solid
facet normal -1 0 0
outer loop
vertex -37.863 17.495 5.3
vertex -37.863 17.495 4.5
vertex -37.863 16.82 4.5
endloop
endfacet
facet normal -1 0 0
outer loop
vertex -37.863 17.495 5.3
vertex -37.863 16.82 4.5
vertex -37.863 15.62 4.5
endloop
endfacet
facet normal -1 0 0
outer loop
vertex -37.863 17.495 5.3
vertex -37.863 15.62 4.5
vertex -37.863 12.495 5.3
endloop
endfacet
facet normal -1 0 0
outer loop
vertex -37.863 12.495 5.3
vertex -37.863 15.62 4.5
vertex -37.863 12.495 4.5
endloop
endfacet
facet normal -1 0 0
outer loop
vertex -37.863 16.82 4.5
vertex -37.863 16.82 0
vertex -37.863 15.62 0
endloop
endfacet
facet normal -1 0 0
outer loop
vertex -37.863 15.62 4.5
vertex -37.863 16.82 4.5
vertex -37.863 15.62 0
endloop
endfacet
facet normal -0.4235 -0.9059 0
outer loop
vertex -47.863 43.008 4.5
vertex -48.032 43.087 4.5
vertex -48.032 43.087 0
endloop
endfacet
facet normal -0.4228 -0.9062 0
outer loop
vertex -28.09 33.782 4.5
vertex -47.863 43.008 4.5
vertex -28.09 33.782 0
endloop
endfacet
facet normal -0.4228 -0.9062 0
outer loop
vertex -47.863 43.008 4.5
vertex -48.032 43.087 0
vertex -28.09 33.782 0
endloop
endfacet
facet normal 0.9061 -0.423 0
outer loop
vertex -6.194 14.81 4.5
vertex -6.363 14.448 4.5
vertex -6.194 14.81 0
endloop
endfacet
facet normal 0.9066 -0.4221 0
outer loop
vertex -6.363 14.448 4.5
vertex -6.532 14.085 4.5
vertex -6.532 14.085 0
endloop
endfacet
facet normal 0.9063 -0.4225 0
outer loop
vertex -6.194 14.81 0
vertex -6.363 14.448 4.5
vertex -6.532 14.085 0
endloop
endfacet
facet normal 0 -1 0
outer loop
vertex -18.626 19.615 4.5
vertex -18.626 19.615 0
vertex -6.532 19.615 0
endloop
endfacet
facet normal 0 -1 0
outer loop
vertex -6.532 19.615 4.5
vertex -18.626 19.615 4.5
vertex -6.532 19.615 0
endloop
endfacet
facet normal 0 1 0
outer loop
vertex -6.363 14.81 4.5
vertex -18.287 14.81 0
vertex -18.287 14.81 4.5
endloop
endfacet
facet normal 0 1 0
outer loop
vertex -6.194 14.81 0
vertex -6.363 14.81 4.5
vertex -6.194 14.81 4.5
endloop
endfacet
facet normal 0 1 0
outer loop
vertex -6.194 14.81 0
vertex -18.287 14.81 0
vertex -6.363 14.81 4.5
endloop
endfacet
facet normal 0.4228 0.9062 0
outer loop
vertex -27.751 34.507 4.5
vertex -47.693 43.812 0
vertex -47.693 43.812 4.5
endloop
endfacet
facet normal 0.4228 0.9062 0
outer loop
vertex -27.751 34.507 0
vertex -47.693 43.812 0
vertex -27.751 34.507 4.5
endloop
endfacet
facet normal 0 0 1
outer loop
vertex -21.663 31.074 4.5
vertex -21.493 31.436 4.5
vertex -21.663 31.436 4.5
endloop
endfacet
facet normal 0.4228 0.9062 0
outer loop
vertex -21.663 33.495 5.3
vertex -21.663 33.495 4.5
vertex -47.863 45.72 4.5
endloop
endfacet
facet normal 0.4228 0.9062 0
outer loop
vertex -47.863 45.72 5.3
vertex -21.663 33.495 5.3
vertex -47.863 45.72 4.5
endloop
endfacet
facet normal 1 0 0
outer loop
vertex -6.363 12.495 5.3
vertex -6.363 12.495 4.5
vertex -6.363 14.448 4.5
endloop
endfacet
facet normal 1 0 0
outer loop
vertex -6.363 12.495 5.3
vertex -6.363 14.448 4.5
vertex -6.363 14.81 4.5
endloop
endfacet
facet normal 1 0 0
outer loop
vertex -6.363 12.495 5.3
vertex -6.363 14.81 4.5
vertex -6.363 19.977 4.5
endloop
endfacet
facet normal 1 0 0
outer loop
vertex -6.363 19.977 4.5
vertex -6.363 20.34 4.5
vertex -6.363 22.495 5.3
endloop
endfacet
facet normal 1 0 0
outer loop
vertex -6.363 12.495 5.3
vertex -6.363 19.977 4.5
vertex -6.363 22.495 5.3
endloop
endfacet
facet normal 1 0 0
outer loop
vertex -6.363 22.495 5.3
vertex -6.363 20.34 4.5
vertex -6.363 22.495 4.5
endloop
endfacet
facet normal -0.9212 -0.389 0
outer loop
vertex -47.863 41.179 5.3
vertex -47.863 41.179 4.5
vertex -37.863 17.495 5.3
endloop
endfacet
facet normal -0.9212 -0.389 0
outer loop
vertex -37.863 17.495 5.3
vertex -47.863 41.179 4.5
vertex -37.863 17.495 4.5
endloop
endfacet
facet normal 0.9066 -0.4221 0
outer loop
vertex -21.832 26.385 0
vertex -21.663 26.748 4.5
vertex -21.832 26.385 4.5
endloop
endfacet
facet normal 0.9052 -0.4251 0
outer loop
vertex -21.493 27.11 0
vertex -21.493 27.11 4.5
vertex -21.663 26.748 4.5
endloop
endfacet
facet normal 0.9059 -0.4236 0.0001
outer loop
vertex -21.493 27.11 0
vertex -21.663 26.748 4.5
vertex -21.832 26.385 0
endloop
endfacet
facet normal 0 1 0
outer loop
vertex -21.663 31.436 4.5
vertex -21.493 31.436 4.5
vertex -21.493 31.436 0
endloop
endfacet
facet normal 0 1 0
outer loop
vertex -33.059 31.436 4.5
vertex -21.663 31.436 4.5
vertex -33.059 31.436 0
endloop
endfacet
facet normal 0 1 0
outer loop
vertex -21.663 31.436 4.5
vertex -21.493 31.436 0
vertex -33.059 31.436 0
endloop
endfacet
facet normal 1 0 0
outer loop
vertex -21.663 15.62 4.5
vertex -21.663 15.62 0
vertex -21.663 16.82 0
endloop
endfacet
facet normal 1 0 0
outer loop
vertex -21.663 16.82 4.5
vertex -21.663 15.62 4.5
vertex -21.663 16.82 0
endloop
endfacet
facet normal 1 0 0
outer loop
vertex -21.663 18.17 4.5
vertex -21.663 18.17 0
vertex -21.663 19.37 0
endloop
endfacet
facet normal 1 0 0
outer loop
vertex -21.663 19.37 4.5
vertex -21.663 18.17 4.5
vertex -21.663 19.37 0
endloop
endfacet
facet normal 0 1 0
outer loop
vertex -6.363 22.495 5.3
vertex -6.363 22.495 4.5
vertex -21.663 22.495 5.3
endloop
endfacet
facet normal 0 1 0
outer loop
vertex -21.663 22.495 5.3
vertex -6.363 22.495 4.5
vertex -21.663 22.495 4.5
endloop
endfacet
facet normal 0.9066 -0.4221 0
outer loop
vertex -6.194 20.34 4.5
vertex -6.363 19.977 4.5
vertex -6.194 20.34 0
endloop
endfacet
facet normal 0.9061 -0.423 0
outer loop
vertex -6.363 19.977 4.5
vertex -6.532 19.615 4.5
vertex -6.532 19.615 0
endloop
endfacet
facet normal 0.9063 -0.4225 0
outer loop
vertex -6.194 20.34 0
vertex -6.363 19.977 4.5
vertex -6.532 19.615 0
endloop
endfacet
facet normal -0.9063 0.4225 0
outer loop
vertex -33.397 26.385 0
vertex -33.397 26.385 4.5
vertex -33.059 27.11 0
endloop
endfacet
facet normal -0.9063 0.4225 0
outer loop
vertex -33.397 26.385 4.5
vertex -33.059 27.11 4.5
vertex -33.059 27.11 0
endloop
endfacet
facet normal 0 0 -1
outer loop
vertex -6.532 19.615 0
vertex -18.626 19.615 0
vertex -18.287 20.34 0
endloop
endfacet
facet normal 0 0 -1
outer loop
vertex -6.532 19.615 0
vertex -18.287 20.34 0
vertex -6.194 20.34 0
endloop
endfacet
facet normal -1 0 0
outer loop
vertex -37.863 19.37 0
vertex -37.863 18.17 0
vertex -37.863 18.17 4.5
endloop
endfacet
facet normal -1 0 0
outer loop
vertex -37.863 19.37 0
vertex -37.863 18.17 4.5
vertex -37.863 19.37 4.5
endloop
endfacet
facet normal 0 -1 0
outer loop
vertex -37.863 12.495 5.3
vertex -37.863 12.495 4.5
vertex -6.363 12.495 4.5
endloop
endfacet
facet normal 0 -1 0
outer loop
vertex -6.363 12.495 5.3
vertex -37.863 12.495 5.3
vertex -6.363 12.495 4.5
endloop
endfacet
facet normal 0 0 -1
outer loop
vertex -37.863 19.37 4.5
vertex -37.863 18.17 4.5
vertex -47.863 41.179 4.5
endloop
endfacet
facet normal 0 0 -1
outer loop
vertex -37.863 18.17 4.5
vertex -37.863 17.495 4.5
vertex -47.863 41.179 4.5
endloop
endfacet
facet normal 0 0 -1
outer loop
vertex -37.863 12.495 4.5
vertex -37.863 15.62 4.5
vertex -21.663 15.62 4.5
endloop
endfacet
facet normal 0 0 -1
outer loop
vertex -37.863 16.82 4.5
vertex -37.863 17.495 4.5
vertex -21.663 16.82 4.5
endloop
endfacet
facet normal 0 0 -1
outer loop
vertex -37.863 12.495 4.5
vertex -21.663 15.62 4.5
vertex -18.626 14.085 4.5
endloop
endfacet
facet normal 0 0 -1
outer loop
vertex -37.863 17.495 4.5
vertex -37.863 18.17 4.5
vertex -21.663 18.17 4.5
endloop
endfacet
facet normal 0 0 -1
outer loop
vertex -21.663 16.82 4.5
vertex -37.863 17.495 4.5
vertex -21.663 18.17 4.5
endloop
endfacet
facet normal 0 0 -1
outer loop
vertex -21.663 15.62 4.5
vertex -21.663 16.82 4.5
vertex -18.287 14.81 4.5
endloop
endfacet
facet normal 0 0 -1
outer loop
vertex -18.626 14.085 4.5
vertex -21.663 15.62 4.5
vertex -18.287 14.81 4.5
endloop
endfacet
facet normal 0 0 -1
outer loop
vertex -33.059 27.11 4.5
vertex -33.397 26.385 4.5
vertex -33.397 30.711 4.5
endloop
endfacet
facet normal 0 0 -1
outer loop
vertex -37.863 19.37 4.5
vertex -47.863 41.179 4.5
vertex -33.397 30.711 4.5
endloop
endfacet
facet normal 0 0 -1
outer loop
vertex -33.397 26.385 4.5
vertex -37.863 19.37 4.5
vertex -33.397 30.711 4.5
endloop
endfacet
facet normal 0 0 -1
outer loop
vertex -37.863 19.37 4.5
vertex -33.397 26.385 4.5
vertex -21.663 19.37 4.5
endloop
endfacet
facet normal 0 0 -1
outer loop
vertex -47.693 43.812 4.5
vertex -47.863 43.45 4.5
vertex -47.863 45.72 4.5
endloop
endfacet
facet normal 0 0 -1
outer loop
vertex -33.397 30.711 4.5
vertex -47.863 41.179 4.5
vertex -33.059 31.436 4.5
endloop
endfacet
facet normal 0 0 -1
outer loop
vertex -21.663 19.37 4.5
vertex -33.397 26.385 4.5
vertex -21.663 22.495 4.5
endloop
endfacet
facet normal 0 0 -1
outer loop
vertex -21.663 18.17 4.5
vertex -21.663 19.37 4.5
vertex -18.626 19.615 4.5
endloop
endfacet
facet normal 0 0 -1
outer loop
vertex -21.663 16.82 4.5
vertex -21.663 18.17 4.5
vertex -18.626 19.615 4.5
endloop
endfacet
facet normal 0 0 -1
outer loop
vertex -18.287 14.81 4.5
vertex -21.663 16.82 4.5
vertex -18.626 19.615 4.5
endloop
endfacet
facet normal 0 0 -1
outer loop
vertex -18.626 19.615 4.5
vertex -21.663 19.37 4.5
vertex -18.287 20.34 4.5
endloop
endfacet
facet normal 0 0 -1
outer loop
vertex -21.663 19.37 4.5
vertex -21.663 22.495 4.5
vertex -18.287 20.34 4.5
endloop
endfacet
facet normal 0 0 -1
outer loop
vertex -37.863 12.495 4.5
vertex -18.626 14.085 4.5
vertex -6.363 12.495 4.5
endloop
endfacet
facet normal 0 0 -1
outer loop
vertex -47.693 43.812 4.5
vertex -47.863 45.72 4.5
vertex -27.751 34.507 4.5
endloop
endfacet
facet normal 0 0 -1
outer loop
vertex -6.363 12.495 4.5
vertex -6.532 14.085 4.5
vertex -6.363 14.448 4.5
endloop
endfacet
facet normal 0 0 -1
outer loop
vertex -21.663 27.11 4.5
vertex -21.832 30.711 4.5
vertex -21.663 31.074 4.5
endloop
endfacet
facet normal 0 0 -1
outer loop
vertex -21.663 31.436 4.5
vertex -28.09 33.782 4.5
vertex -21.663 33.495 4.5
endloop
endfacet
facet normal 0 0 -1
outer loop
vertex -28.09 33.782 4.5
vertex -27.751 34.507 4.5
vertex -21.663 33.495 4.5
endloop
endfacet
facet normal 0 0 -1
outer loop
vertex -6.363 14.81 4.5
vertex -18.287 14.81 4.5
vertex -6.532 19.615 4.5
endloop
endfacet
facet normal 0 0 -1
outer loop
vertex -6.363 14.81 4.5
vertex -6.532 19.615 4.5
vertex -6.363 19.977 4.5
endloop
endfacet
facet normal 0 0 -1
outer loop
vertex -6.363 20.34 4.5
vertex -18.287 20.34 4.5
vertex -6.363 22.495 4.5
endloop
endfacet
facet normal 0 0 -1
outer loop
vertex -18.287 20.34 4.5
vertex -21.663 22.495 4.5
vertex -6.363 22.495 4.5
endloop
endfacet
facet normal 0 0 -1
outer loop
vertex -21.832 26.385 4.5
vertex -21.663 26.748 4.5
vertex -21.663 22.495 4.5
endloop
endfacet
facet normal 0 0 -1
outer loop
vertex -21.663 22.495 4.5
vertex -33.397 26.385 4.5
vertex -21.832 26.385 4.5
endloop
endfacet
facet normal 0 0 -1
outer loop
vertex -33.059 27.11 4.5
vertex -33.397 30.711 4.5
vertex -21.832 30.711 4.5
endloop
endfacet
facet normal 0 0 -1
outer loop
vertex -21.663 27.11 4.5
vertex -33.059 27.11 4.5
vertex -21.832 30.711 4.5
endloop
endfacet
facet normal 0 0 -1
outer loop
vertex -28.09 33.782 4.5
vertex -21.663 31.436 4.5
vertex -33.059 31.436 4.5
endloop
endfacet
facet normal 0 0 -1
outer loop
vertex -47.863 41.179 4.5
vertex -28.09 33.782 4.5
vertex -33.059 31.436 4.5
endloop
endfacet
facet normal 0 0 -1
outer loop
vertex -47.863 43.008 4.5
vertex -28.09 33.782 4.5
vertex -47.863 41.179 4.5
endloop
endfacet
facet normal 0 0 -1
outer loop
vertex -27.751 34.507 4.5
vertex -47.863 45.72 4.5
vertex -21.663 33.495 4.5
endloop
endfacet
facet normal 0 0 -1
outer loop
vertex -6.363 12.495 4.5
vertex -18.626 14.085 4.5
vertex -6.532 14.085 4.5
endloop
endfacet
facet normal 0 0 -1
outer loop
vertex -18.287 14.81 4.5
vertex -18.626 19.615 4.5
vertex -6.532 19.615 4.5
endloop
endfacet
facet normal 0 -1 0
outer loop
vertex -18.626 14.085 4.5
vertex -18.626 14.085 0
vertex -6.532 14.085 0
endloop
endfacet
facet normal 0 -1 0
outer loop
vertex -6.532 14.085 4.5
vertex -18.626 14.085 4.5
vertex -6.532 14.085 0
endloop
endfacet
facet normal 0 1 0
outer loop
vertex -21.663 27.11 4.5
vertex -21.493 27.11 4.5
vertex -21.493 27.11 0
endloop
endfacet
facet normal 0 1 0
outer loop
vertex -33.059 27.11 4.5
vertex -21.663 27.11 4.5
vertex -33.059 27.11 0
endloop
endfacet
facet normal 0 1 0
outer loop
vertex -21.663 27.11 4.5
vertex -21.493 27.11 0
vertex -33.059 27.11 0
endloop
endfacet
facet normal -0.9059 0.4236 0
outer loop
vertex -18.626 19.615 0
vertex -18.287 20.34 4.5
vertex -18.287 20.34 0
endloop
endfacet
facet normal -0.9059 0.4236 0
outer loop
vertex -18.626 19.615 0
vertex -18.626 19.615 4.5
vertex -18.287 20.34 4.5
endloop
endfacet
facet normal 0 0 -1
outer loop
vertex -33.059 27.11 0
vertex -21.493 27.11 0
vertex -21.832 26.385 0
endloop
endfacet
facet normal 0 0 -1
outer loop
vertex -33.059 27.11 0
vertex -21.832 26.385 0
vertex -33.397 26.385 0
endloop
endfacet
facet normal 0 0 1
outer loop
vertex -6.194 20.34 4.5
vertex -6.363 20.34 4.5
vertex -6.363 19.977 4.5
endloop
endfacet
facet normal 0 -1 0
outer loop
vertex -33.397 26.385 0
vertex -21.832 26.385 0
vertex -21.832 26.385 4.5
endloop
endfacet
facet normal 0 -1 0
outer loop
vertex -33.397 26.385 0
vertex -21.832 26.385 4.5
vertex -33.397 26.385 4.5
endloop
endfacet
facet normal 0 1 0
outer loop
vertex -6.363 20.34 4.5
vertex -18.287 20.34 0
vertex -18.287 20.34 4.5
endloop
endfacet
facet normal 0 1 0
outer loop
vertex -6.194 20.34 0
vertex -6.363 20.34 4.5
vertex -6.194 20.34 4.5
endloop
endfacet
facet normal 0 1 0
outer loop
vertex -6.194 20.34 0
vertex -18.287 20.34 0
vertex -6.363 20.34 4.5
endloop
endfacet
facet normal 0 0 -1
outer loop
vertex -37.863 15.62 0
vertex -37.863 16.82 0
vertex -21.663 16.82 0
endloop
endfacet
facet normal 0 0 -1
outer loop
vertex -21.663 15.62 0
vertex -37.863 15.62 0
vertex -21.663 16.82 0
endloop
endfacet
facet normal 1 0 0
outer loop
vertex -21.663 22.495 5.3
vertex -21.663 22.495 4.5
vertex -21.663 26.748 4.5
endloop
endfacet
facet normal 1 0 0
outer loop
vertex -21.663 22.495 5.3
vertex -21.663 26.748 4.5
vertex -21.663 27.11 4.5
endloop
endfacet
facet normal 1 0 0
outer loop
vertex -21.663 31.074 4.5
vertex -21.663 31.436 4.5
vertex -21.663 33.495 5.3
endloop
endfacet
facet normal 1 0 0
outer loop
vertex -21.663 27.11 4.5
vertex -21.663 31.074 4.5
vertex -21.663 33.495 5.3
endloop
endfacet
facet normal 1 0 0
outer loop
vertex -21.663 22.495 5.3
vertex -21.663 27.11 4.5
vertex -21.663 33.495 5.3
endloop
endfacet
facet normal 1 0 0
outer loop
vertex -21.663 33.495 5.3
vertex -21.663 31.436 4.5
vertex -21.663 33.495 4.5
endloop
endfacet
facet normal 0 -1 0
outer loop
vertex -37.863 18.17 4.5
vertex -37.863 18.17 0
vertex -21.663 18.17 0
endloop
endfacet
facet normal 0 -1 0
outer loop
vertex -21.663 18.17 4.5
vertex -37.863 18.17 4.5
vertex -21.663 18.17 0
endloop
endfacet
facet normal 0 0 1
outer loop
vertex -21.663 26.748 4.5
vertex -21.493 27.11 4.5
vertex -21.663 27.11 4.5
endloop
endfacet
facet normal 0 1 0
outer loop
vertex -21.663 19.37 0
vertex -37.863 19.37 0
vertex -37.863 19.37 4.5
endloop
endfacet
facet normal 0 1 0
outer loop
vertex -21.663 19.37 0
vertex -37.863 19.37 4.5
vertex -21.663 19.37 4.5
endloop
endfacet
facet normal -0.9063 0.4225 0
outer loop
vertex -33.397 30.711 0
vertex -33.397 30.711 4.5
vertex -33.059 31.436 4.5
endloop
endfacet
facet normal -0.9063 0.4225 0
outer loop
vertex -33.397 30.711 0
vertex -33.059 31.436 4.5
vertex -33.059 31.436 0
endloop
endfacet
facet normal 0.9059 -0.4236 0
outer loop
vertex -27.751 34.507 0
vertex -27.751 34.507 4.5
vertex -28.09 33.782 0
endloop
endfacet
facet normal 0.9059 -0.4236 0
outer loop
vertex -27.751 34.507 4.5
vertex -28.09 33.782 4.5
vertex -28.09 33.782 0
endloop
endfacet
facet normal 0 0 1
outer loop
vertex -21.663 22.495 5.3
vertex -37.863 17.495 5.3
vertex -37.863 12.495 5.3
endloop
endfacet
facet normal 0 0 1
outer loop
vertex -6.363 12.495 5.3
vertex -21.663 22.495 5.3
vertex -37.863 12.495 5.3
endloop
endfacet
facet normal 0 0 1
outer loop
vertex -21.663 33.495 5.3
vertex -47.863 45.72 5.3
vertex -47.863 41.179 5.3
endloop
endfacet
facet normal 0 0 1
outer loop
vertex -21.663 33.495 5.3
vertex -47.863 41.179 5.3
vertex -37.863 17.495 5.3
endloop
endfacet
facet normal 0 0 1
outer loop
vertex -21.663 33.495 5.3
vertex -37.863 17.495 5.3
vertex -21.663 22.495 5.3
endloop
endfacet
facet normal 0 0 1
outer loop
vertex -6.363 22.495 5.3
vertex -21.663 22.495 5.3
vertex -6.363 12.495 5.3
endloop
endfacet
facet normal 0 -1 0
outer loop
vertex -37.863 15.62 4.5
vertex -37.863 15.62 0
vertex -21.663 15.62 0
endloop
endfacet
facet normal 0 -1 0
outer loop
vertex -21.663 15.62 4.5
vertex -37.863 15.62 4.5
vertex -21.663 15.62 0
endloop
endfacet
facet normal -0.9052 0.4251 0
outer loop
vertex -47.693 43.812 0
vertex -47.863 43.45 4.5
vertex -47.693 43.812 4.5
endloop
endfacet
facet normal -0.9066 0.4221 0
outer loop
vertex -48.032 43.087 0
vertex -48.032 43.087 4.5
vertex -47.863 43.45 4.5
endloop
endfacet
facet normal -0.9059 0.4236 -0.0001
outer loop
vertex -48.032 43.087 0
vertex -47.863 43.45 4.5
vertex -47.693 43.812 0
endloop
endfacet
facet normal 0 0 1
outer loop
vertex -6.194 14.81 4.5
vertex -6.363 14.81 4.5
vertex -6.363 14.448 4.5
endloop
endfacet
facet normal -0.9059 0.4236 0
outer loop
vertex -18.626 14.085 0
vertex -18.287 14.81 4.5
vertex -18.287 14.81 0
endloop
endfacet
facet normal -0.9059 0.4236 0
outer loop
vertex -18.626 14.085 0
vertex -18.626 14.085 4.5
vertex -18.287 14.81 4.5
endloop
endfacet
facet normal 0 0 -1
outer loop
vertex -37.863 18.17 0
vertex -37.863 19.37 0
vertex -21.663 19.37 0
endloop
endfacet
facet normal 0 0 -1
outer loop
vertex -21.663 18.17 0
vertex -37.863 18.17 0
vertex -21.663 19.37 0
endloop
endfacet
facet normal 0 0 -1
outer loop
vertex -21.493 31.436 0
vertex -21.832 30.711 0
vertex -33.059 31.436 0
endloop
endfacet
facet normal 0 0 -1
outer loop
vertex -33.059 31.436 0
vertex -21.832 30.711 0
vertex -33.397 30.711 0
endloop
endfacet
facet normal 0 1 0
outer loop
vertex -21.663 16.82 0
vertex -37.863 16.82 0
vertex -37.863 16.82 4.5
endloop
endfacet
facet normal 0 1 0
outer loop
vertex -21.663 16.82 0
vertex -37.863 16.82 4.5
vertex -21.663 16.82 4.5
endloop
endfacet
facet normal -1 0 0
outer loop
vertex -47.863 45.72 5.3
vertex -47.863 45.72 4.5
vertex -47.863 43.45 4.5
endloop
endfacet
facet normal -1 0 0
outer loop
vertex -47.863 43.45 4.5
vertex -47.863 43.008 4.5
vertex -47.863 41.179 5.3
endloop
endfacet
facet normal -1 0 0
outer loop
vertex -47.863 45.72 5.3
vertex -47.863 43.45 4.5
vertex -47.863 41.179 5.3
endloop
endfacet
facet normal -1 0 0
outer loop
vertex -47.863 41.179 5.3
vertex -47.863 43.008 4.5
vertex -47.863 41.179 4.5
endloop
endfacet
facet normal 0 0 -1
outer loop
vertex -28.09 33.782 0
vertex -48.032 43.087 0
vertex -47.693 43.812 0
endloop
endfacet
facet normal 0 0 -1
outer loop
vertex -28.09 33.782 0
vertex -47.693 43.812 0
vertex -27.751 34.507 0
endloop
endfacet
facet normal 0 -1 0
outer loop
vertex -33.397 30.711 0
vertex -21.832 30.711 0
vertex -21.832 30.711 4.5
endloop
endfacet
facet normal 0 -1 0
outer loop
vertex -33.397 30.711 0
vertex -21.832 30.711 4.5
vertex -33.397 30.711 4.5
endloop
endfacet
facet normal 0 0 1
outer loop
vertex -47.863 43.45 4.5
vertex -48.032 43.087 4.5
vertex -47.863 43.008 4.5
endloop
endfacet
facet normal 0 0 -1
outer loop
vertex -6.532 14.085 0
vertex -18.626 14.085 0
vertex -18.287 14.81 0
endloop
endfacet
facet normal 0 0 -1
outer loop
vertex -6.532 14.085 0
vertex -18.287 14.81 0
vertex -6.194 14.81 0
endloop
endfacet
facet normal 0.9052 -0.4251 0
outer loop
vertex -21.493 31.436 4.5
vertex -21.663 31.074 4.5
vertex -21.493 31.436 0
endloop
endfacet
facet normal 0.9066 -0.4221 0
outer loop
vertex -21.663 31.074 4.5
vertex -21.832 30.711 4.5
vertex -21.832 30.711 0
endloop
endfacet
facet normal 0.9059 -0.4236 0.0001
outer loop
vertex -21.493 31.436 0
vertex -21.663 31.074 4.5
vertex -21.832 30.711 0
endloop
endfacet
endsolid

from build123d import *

# Parameters (mm, degrees)
F0_W     = 16.2
F0_H     = 1.2
F1_DEPTH = 4.5
F2_W     = 16.2
F2_H     = 0.675
F2_H_2   = 1.2
F2_H_3   = 3.125
F3_DEPTH = 0.8
F5_E28_W = 22.0063713977
F5_E28_H = 4.5
F5_E29_W = 12.0937982574
F5_E29_H = 4.5
F5_E30_W = 12.0937982574
F5_E30_H = 4.5
F5_E31_W = 11.5652361646
F5_E31_H = 4.5
F5_E32_W = 11.5652361646
F5_E32_H = 4.5
F6_DEPTH = 0.4


with BuildPart() as f1:
    # F0 (on Top) → F1 (new body)
    with BuildSketch(Plane.XY):
        with Locations((-29.7626322135, 18.7695161968)):
            Rectangle(F0_W, F0_H)
    extrude(amount=F1_DEPTH)



with BuildPart() as f1b:
    # F0 (on Top) → F1, piece 2 (new body)
    with BuildSketch(Plane.XY):
        with Locations((-29.7626322135, 16.2195161968)):
            Rectangle(F0_W, F0_H)
    extrude(amount=F1_DEPTH)


with BuildPart() as f1_1:
    add(f1.part)

    add(f1b.part)  # F3 merges F1b
    # F2 (on face) → F3 (join)
    with BuildSketch(Plane.XY.offset(4.5)):
        Polygon((-47.8626322135, 41.1793105304), (-37.8626322135, 17.4945161968), (-21.6626322135, 17.4945161968), (-21.6626322135, 22.4945161968), (-21.6626322135, 33.4945161968), (-47.8626322135, 45.7203537226), align=None)
        Polygon((-21.6626322135, 22.4945161968), (-21.6626322135, 17.4945161968), (-21.6626322135, 16.8195161968), (-21.6626322135, 15.6195161968), (-21.6626322135, 12.4945161968), (-6.3626514748, 12.4945161968), (-6.3626514748, 22.4945161968), align=None)
        with Locations((-29.7626322135, 17.1570161968)):
            Rectangle(F2_W, F2_H)
        with Locations((-29.7626322135, 16.2195161968)):
            Rectangle(F2_W, F2_H_2)
        with Locations((-29.7626322135, 14.0570161968)):
            Rectangle(F2_W, F2_H_3)
    extrude(amount=F3_DEPTH)

    # F5_E28 (on explicit) + F5_E29 (on explicit) + F5_E30 (on explicit) + F5_E31 (on explicit) + F5_E32 (on explicit) → F6 (join, symmetric)
    with BuildSketch(Plane(origin=(-47.8626322135, 43.4498321265, 4.5), x_dir=(0.9061941294, -0.4228619158, 0), z_dir=(0.4228619158, 0.9061941294, 0))):
        with Locations((11.0031856988, 2.25)):
            Rectangle(F5_E28_W, F5_E28_H)
    with BuildSketch(Plane(origin=(-18.4564497322, 19.9771542102, 4.5), x_dir=(1, 0, 0), z_dir=(0, 1, 0))):
        with Locations((6.0468991287, 2.25)):
            Rectangle(F5_E29_W, F5_E29_H)
    with BuildSketch(Plane(origin=(-18.4564497322, 14.4476536661, 4.5), x_dir=(1, 0, 0), z_dir=(0, 1, 0))):
        with Locations((6.0468991287, 2.25)):
            Rectangle(F5_E30_W, F5_E30_H)
    with BuildSketch(Plane(origin=(-21.6626322135, 31.073756516, 4.5), x_dir=(-1, 0, 0), z_dir=(0, -1, 0))):
        with Locations((5.7826180823, 2.25)):
            Rectangle(F5_E31_W, F5_E31_H)
    with BuildSketch(Plane(origin=(-21.6626322135, 26.7479624599, 4.5), x_dir=(-1, 0, 0), z_dir=(0, -1, 0))):
        with Locations((5.7826180823, 2.25)):
            Rectangle(F5_E32_W, F5_E32_H)
    extrude(amount=F6_DEPTH, both=True, dir=(0.4228619158, 0.9061941294, 0))


solid = f1_1.part
